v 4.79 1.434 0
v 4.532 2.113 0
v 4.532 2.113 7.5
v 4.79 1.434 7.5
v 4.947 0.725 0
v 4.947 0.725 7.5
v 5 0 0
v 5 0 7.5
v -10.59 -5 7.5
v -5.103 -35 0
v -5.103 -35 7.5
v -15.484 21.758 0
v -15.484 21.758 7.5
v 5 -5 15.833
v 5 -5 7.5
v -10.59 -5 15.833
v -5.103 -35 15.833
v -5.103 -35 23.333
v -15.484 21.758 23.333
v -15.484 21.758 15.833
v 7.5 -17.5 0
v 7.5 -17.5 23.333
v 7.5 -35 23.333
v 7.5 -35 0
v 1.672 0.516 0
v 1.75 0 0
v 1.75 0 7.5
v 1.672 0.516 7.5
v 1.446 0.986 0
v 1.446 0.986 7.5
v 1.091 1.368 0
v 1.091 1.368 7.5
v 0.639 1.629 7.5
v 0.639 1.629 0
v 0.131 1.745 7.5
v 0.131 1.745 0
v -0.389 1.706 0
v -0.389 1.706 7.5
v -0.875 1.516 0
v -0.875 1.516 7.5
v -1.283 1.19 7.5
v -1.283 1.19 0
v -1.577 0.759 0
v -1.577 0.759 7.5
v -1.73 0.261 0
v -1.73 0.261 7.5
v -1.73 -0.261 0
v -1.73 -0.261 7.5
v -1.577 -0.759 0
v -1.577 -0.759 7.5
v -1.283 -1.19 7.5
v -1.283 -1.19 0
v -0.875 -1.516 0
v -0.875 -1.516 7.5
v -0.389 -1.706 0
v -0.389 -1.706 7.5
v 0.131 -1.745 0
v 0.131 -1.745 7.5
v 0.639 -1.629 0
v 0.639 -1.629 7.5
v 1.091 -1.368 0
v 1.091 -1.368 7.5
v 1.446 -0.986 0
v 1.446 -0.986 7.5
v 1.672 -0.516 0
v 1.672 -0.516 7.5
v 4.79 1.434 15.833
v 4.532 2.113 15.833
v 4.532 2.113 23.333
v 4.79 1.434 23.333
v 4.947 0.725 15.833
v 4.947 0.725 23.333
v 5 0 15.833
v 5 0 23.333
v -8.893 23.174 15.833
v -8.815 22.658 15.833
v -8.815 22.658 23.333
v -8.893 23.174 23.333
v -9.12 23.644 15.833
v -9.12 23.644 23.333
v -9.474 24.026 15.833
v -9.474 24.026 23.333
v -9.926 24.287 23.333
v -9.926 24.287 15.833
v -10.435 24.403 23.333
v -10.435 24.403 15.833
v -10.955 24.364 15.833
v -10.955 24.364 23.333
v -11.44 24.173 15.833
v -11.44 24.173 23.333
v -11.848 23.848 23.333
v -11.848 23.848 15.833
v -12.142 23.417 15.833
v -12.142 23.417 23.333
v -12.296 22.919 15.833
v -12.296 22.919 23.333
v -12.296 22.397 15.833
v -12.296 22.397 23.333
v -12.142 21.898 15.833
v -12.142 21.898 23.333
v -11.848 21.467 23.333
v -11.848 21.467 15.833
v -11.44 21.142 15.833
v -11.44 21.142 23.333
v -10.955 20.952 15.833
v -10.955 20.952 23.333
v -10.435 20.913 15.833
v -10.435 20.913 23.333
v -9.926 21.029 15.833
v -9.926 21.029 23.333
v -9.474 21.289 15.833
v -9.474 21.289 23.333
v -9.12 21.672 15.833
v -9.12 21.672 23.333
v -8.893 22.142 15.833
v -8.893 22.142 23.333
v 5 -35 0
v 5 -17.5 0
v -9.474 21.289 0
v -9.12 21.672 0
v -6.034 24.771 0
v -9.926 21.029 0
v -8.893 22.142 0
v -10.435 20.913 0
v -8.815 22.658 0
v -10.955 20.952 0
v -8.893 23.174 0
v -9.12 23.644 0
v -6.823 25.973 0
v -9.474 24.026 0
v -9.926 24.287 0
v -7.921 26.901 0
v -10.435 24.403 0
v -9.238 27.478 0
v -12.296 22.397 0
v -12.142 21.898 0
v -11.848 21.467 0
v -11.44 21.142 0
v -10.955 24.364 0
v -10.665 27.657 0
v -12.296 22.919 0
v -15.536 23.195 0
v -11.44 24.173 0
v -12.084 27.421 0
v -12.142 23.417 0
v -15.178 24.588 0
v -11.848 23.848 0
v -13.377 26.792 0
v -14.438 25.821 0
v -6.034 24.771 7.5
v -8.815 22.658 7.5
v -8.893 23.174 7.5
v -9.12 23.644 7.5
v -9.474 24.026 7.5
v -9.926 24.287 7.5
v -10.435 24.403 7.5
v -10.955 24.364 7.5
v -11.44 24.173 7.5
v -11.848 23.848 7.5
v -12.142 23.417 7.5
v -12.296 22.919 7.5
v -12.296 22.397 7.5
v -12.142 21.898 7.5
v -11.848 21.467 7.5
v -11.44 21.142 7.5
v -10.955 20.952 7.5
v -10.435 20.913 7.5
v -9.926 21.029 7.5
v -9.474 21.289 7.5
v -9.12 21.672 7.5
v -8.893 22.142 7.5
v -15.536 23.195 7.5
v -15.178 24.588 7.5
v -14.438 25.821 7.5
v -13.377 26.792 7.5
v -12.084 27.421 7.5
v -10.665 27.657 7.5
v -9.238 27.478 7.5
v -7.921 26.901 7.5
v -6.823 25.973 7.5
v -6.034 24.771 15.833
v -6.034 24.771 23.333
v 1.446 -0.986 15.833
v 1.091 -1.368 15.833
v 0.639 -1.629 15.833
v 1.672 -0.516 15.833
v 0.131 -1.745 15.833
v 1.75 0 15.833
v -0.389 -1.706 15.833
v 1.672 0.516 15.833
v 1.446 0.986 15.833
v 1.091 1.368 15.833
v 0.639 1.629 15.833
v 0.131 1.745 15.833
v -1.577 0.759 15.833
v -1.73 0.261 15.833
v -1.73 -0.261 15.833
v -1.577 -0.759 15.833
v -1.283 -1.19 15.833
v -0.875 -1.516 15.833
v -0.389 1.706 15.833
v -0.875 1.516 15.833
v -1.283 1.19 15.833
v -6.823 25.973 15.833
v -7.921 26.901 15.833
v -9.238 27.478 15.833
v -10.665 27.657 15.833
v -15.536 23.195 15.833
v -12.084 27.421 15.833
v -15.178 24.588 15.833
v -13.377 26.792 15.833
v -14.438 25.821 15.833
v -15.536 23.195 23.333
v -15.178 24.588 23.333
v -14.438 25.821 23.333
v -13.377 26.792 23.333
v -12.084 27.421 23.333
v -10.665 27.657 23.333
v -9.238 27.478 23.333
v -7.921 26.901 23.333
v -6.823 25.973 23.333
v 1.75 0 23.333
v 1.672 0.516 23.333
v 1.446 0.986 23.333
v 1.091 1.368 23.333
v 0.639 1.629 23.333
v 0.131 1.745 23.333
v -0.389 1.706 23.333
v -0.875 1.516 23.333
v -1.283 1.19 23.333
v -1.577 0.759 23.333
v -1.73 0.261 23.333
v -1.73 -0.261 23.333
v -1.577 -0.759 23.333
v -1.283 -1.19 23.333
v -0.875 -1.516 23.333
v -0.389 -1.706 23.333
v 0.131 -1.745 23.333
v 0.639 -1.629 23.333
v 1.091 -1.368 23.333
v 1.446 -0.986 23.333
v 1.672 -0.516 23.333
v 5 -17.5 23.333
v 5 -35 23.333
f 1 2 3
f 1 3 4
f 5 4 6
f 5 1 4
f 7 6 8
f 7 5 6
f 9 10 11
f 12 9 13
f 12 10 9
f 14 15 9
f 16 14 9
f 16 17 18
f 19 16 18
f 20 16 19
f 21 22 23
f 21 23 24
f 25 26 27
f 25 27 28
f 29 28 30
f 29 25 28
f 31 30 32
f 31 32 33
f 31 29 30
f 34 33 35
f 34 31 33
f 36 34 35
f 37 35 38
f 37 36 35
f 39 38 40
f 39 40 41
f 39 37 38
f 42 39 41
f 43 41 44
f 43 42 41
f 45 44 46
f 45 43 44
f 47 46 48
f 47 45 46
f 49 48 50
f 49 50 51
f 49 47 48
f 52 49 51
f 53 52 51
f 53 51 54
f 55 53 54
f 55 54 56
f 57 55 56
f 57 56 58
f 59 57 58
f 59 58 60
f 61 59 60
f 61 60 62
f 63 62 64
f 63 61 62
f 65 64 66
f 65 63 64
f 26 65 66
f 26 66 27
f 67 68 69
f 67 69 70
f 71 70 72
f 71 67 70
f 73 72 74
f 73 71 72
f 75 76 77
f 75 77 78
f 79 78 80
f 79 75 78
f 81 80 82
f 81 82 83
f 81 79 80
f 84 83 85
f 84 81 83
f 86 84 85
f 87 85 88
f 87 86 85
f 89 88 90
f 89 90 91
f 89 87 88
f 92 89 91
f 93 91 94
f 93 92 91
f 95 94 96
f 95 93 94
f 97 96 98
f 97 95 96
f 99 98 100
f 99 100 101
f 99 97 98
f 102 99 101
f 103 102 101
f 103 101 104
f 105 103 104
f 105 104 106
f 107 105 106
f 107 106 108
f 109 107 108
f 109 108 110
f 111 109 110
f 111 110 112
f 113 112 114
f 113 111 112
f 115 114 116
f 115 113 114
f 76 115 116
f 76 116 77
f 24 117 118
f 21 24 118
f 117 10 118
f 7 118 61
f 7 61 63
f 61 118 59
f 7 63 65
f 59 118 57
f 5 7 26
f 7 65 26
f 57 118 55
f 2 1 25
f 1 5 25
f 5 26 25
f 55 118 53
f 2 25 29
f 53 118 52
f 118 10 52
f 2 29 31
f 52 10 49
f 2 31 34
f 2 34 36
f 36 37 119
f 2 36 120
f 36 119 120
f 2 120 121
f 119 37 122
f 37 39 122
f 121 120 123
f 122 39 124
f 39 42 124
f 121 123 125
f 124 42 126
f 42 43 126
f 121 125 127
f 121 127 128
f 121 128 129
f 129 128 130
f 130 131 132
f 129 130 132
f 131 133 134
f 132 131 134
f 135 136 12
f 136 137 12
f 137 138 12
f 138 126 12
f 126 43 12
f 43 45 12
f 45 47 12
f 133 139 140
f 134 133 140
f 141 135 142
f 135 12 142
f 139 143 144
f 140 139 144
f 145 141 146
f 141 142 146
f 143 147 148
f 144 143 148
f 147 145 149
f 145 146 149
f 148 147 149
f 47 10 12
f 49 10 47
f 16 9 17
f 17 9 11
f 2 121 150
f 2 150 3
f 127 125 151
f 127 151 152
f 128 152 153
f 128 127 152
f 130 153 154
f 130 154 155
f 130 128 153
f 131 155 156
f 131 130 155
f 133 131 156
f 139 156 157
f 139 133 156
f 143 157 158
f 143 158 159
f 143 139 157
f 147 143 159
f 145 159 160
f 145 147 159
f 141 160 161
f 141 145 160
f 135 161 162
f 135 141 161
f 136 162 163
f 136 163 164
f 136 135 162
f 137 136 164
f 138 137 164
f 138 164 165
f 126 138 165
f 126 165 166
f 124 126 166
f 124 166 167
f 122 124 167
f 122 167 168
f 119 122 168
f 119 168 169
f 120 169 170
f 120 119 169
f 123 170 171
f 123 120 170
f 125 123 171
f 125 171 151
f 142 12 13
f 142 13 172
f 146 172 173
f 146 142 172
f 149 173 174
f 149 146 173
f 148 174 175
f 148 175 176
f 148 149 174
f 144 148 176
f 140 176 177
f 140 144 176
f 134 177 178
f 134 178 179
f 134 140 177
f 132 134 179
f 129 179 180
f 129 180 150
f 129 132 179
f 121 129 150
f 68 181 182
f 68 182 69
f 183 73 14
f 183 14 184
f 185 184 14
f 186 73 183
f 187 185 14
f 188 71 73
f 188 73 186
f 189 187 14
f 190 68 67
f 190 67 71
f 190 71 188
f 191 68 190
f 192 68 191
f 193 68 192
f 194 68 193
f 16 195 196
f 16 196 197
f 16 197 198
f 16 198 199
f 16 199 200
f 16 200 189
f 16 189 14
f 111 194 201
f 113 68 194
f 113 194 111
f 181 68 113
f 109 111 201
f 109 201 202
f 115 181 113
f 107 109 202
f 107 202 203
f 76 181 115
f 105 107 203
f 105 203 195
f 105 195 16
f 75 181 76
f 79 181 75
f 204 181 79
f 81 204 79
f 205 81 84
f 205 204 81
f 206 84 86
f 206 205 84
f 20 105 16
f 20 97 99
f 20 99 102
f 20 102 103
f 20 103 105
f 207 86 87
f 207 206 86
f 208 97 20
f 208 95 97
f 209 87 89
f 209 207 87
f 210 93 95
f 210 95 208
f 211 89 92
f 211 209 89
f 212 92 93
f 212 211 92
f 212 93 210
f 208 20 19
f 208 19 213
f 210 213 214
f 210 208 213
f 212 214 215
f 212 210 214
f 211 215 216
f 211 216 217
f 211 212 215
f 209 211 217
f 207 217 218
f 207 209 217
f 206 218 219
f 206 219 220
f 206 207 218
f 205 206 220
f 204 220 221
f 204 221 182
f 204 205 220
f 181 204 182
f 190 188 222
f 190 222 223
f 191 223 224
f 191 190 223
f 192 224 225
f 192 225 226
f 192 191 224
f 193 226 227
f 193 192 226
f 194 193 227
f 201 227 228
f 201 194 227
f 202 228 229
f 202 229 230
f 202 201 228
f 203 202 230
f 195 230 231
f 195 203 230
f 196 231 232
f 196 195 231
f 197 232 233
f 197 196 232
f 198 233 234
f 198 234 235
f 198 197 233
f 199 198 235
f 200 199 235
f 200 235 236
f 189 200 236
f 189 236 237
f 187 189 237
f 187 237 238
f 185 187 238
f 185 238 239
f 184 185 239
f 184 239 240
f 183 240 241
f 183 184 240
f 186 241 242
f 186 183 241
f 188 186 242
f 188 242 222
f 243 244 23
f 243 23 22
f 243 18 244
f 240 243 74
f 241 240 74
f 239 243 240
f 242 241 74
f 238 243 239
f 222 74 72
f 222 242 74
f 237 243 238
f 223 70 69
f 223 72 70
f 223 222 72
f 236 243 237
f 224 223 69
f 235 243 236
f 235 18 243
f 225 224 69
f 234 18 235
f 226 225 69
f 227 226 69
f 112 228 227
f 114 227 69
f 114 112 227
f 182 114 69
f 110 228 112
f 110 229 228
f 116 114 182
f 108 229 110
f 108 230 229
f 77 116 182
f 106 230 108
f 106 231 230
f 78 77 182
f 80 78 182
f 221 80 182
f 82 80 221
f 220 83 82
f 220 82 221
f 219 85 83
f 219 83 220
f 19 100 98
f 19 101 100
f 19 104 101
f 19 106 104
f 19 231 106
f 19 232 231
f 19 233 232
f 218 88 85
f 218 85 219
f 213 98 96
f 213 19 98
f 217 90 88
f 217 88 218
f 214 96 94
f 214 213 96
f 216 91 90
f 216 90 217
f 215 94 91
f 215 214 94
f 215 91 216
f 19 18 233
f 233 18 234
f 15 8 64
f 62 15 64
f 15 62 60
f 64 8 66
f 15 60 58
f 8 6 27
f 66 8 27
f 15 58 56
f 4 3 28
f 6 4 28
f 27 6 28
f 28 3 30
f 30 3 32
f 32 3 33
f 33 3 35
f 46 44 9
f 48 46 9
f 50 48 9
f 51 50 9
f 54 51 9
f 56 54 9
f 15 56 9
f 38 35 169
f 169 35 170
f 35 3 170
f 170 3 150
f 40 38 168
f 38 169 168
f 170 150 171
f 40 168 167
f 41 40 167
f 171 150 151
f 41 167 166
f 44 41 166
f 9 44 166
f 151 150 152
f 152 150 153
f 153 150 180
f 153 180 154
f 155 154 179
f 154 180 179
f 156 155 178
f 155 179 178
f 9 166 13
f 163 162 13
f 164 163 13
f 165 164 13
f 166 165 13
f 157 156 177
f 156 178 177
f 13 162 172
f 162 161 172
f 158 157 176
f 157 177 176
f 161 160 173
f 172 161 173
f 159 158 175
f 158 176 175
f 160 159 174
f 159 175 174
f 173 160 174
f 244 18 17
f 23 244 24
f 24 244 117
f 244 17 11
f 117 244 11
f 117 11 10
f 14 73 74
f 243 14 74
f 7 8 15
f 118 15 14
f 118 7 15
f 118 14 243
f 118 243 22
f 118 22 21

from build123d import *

# Parameters (mm, degrees)
SKETCH1_R           = 1.75
BOSS_EXTRUDE1_DEPTH = 7.5
BOSS_EXTRUDE2_DEPTH = 8.333333333
SKETCH3_R           = 1.75
BOSS_EXTRUDE4_DEPTH = 7.5
SKETCH4_W           = 23.333333333
SKETCH4_H           = 17.5
BOSS_EXTRUDE5_DEPTH = 2.5


with BuildPart() as part:
    # Sketch1 → Boss-Extrude1 (new body)
    with BuildSketch(Plane.XY):
        with BuildLine():
            Line((-6.033917608, 24.770785985), (4.531538935, 2.113091309))
            ThreePointArc((4.531538935, 2.113091309), (4.881480036, 1.08219807), (5, 0))
            Line((5, 0), (5, -35))
            Line((5, -35), (-5.1028501, -35))
            Line((-5.1028501, -35), (-15.483867589, 21.758121008))
            ThreePointArc((-15.483867589, 21.758121008), (-12.084158316, 27.421468907), (-6.033917608, 24.770785985))
        make_face()
        with Locations((-10.565456544, 22.657694676)):
            Circle(SKETCH1_R, mode=Mode.SUBTRACT)
        Circle(SKETCH1_R, mode=Mode.SUBTRACT)
    extrude(amount=BOSS_EXTRUDE1_DEPTH)

    # Sketch2 → Boss-Extrude2 (add)
    with BuildSketch(Plane.XY.offset(7.5)):
        Polygon((5, -5), (-10.589827455, -5), (-5.1028501, -35), (5, -35), align=None)
    extrude(amount=BOSS_EXTRUDE2_DEPTH)

    # Sketch3 → Boss-Extrude4 (add)
    with BuildSketch(Plane.XY.offset(15.833333333)):
        with BuildLine():
            Line((5, 0), (5, -35))
            Line((5, -35), (-5.1028501, -35))
            Line((-5.1028501, -35), (-15.483867589, 21.758121008))
            ThreePointArc((-15.483867589, 21.758121008), (-12.084158316, 27.421468907), (-6.033917608, 24.770785985))
            Line((-6.033917608, 24.770785985), (4.531538935, 2.113091309))
            ThreePointArc((4.531538935, 2.113091309), (4.881480036, 1.08219807), (5, 0))
        make_face()
        Circle(SKETCH3_R, mode=Mode.SUBTRACT)
        with Locations((-10.565456544, 22.657694676)):
            Circle(SKETCH3_R, mode=Mode.SUBTRACT)
    extrude(amount=BOSS_EXTRUDE4_DEPTH)

    # Sketch4 → Boss-Extrude5 (add)
    with BuildSketch(Plane(origin=(5, 0, 0), x_dir=(0, 0, -1), z_dir=(1, 0, 0))):
        with Locations((-11.666666667, -26.25)):
            Rectangle(SKETCH4_W, SKETCH4_H)
    extrude(amount=BOSS_EXTRUDE5_DEPTH)


solid = part.part
